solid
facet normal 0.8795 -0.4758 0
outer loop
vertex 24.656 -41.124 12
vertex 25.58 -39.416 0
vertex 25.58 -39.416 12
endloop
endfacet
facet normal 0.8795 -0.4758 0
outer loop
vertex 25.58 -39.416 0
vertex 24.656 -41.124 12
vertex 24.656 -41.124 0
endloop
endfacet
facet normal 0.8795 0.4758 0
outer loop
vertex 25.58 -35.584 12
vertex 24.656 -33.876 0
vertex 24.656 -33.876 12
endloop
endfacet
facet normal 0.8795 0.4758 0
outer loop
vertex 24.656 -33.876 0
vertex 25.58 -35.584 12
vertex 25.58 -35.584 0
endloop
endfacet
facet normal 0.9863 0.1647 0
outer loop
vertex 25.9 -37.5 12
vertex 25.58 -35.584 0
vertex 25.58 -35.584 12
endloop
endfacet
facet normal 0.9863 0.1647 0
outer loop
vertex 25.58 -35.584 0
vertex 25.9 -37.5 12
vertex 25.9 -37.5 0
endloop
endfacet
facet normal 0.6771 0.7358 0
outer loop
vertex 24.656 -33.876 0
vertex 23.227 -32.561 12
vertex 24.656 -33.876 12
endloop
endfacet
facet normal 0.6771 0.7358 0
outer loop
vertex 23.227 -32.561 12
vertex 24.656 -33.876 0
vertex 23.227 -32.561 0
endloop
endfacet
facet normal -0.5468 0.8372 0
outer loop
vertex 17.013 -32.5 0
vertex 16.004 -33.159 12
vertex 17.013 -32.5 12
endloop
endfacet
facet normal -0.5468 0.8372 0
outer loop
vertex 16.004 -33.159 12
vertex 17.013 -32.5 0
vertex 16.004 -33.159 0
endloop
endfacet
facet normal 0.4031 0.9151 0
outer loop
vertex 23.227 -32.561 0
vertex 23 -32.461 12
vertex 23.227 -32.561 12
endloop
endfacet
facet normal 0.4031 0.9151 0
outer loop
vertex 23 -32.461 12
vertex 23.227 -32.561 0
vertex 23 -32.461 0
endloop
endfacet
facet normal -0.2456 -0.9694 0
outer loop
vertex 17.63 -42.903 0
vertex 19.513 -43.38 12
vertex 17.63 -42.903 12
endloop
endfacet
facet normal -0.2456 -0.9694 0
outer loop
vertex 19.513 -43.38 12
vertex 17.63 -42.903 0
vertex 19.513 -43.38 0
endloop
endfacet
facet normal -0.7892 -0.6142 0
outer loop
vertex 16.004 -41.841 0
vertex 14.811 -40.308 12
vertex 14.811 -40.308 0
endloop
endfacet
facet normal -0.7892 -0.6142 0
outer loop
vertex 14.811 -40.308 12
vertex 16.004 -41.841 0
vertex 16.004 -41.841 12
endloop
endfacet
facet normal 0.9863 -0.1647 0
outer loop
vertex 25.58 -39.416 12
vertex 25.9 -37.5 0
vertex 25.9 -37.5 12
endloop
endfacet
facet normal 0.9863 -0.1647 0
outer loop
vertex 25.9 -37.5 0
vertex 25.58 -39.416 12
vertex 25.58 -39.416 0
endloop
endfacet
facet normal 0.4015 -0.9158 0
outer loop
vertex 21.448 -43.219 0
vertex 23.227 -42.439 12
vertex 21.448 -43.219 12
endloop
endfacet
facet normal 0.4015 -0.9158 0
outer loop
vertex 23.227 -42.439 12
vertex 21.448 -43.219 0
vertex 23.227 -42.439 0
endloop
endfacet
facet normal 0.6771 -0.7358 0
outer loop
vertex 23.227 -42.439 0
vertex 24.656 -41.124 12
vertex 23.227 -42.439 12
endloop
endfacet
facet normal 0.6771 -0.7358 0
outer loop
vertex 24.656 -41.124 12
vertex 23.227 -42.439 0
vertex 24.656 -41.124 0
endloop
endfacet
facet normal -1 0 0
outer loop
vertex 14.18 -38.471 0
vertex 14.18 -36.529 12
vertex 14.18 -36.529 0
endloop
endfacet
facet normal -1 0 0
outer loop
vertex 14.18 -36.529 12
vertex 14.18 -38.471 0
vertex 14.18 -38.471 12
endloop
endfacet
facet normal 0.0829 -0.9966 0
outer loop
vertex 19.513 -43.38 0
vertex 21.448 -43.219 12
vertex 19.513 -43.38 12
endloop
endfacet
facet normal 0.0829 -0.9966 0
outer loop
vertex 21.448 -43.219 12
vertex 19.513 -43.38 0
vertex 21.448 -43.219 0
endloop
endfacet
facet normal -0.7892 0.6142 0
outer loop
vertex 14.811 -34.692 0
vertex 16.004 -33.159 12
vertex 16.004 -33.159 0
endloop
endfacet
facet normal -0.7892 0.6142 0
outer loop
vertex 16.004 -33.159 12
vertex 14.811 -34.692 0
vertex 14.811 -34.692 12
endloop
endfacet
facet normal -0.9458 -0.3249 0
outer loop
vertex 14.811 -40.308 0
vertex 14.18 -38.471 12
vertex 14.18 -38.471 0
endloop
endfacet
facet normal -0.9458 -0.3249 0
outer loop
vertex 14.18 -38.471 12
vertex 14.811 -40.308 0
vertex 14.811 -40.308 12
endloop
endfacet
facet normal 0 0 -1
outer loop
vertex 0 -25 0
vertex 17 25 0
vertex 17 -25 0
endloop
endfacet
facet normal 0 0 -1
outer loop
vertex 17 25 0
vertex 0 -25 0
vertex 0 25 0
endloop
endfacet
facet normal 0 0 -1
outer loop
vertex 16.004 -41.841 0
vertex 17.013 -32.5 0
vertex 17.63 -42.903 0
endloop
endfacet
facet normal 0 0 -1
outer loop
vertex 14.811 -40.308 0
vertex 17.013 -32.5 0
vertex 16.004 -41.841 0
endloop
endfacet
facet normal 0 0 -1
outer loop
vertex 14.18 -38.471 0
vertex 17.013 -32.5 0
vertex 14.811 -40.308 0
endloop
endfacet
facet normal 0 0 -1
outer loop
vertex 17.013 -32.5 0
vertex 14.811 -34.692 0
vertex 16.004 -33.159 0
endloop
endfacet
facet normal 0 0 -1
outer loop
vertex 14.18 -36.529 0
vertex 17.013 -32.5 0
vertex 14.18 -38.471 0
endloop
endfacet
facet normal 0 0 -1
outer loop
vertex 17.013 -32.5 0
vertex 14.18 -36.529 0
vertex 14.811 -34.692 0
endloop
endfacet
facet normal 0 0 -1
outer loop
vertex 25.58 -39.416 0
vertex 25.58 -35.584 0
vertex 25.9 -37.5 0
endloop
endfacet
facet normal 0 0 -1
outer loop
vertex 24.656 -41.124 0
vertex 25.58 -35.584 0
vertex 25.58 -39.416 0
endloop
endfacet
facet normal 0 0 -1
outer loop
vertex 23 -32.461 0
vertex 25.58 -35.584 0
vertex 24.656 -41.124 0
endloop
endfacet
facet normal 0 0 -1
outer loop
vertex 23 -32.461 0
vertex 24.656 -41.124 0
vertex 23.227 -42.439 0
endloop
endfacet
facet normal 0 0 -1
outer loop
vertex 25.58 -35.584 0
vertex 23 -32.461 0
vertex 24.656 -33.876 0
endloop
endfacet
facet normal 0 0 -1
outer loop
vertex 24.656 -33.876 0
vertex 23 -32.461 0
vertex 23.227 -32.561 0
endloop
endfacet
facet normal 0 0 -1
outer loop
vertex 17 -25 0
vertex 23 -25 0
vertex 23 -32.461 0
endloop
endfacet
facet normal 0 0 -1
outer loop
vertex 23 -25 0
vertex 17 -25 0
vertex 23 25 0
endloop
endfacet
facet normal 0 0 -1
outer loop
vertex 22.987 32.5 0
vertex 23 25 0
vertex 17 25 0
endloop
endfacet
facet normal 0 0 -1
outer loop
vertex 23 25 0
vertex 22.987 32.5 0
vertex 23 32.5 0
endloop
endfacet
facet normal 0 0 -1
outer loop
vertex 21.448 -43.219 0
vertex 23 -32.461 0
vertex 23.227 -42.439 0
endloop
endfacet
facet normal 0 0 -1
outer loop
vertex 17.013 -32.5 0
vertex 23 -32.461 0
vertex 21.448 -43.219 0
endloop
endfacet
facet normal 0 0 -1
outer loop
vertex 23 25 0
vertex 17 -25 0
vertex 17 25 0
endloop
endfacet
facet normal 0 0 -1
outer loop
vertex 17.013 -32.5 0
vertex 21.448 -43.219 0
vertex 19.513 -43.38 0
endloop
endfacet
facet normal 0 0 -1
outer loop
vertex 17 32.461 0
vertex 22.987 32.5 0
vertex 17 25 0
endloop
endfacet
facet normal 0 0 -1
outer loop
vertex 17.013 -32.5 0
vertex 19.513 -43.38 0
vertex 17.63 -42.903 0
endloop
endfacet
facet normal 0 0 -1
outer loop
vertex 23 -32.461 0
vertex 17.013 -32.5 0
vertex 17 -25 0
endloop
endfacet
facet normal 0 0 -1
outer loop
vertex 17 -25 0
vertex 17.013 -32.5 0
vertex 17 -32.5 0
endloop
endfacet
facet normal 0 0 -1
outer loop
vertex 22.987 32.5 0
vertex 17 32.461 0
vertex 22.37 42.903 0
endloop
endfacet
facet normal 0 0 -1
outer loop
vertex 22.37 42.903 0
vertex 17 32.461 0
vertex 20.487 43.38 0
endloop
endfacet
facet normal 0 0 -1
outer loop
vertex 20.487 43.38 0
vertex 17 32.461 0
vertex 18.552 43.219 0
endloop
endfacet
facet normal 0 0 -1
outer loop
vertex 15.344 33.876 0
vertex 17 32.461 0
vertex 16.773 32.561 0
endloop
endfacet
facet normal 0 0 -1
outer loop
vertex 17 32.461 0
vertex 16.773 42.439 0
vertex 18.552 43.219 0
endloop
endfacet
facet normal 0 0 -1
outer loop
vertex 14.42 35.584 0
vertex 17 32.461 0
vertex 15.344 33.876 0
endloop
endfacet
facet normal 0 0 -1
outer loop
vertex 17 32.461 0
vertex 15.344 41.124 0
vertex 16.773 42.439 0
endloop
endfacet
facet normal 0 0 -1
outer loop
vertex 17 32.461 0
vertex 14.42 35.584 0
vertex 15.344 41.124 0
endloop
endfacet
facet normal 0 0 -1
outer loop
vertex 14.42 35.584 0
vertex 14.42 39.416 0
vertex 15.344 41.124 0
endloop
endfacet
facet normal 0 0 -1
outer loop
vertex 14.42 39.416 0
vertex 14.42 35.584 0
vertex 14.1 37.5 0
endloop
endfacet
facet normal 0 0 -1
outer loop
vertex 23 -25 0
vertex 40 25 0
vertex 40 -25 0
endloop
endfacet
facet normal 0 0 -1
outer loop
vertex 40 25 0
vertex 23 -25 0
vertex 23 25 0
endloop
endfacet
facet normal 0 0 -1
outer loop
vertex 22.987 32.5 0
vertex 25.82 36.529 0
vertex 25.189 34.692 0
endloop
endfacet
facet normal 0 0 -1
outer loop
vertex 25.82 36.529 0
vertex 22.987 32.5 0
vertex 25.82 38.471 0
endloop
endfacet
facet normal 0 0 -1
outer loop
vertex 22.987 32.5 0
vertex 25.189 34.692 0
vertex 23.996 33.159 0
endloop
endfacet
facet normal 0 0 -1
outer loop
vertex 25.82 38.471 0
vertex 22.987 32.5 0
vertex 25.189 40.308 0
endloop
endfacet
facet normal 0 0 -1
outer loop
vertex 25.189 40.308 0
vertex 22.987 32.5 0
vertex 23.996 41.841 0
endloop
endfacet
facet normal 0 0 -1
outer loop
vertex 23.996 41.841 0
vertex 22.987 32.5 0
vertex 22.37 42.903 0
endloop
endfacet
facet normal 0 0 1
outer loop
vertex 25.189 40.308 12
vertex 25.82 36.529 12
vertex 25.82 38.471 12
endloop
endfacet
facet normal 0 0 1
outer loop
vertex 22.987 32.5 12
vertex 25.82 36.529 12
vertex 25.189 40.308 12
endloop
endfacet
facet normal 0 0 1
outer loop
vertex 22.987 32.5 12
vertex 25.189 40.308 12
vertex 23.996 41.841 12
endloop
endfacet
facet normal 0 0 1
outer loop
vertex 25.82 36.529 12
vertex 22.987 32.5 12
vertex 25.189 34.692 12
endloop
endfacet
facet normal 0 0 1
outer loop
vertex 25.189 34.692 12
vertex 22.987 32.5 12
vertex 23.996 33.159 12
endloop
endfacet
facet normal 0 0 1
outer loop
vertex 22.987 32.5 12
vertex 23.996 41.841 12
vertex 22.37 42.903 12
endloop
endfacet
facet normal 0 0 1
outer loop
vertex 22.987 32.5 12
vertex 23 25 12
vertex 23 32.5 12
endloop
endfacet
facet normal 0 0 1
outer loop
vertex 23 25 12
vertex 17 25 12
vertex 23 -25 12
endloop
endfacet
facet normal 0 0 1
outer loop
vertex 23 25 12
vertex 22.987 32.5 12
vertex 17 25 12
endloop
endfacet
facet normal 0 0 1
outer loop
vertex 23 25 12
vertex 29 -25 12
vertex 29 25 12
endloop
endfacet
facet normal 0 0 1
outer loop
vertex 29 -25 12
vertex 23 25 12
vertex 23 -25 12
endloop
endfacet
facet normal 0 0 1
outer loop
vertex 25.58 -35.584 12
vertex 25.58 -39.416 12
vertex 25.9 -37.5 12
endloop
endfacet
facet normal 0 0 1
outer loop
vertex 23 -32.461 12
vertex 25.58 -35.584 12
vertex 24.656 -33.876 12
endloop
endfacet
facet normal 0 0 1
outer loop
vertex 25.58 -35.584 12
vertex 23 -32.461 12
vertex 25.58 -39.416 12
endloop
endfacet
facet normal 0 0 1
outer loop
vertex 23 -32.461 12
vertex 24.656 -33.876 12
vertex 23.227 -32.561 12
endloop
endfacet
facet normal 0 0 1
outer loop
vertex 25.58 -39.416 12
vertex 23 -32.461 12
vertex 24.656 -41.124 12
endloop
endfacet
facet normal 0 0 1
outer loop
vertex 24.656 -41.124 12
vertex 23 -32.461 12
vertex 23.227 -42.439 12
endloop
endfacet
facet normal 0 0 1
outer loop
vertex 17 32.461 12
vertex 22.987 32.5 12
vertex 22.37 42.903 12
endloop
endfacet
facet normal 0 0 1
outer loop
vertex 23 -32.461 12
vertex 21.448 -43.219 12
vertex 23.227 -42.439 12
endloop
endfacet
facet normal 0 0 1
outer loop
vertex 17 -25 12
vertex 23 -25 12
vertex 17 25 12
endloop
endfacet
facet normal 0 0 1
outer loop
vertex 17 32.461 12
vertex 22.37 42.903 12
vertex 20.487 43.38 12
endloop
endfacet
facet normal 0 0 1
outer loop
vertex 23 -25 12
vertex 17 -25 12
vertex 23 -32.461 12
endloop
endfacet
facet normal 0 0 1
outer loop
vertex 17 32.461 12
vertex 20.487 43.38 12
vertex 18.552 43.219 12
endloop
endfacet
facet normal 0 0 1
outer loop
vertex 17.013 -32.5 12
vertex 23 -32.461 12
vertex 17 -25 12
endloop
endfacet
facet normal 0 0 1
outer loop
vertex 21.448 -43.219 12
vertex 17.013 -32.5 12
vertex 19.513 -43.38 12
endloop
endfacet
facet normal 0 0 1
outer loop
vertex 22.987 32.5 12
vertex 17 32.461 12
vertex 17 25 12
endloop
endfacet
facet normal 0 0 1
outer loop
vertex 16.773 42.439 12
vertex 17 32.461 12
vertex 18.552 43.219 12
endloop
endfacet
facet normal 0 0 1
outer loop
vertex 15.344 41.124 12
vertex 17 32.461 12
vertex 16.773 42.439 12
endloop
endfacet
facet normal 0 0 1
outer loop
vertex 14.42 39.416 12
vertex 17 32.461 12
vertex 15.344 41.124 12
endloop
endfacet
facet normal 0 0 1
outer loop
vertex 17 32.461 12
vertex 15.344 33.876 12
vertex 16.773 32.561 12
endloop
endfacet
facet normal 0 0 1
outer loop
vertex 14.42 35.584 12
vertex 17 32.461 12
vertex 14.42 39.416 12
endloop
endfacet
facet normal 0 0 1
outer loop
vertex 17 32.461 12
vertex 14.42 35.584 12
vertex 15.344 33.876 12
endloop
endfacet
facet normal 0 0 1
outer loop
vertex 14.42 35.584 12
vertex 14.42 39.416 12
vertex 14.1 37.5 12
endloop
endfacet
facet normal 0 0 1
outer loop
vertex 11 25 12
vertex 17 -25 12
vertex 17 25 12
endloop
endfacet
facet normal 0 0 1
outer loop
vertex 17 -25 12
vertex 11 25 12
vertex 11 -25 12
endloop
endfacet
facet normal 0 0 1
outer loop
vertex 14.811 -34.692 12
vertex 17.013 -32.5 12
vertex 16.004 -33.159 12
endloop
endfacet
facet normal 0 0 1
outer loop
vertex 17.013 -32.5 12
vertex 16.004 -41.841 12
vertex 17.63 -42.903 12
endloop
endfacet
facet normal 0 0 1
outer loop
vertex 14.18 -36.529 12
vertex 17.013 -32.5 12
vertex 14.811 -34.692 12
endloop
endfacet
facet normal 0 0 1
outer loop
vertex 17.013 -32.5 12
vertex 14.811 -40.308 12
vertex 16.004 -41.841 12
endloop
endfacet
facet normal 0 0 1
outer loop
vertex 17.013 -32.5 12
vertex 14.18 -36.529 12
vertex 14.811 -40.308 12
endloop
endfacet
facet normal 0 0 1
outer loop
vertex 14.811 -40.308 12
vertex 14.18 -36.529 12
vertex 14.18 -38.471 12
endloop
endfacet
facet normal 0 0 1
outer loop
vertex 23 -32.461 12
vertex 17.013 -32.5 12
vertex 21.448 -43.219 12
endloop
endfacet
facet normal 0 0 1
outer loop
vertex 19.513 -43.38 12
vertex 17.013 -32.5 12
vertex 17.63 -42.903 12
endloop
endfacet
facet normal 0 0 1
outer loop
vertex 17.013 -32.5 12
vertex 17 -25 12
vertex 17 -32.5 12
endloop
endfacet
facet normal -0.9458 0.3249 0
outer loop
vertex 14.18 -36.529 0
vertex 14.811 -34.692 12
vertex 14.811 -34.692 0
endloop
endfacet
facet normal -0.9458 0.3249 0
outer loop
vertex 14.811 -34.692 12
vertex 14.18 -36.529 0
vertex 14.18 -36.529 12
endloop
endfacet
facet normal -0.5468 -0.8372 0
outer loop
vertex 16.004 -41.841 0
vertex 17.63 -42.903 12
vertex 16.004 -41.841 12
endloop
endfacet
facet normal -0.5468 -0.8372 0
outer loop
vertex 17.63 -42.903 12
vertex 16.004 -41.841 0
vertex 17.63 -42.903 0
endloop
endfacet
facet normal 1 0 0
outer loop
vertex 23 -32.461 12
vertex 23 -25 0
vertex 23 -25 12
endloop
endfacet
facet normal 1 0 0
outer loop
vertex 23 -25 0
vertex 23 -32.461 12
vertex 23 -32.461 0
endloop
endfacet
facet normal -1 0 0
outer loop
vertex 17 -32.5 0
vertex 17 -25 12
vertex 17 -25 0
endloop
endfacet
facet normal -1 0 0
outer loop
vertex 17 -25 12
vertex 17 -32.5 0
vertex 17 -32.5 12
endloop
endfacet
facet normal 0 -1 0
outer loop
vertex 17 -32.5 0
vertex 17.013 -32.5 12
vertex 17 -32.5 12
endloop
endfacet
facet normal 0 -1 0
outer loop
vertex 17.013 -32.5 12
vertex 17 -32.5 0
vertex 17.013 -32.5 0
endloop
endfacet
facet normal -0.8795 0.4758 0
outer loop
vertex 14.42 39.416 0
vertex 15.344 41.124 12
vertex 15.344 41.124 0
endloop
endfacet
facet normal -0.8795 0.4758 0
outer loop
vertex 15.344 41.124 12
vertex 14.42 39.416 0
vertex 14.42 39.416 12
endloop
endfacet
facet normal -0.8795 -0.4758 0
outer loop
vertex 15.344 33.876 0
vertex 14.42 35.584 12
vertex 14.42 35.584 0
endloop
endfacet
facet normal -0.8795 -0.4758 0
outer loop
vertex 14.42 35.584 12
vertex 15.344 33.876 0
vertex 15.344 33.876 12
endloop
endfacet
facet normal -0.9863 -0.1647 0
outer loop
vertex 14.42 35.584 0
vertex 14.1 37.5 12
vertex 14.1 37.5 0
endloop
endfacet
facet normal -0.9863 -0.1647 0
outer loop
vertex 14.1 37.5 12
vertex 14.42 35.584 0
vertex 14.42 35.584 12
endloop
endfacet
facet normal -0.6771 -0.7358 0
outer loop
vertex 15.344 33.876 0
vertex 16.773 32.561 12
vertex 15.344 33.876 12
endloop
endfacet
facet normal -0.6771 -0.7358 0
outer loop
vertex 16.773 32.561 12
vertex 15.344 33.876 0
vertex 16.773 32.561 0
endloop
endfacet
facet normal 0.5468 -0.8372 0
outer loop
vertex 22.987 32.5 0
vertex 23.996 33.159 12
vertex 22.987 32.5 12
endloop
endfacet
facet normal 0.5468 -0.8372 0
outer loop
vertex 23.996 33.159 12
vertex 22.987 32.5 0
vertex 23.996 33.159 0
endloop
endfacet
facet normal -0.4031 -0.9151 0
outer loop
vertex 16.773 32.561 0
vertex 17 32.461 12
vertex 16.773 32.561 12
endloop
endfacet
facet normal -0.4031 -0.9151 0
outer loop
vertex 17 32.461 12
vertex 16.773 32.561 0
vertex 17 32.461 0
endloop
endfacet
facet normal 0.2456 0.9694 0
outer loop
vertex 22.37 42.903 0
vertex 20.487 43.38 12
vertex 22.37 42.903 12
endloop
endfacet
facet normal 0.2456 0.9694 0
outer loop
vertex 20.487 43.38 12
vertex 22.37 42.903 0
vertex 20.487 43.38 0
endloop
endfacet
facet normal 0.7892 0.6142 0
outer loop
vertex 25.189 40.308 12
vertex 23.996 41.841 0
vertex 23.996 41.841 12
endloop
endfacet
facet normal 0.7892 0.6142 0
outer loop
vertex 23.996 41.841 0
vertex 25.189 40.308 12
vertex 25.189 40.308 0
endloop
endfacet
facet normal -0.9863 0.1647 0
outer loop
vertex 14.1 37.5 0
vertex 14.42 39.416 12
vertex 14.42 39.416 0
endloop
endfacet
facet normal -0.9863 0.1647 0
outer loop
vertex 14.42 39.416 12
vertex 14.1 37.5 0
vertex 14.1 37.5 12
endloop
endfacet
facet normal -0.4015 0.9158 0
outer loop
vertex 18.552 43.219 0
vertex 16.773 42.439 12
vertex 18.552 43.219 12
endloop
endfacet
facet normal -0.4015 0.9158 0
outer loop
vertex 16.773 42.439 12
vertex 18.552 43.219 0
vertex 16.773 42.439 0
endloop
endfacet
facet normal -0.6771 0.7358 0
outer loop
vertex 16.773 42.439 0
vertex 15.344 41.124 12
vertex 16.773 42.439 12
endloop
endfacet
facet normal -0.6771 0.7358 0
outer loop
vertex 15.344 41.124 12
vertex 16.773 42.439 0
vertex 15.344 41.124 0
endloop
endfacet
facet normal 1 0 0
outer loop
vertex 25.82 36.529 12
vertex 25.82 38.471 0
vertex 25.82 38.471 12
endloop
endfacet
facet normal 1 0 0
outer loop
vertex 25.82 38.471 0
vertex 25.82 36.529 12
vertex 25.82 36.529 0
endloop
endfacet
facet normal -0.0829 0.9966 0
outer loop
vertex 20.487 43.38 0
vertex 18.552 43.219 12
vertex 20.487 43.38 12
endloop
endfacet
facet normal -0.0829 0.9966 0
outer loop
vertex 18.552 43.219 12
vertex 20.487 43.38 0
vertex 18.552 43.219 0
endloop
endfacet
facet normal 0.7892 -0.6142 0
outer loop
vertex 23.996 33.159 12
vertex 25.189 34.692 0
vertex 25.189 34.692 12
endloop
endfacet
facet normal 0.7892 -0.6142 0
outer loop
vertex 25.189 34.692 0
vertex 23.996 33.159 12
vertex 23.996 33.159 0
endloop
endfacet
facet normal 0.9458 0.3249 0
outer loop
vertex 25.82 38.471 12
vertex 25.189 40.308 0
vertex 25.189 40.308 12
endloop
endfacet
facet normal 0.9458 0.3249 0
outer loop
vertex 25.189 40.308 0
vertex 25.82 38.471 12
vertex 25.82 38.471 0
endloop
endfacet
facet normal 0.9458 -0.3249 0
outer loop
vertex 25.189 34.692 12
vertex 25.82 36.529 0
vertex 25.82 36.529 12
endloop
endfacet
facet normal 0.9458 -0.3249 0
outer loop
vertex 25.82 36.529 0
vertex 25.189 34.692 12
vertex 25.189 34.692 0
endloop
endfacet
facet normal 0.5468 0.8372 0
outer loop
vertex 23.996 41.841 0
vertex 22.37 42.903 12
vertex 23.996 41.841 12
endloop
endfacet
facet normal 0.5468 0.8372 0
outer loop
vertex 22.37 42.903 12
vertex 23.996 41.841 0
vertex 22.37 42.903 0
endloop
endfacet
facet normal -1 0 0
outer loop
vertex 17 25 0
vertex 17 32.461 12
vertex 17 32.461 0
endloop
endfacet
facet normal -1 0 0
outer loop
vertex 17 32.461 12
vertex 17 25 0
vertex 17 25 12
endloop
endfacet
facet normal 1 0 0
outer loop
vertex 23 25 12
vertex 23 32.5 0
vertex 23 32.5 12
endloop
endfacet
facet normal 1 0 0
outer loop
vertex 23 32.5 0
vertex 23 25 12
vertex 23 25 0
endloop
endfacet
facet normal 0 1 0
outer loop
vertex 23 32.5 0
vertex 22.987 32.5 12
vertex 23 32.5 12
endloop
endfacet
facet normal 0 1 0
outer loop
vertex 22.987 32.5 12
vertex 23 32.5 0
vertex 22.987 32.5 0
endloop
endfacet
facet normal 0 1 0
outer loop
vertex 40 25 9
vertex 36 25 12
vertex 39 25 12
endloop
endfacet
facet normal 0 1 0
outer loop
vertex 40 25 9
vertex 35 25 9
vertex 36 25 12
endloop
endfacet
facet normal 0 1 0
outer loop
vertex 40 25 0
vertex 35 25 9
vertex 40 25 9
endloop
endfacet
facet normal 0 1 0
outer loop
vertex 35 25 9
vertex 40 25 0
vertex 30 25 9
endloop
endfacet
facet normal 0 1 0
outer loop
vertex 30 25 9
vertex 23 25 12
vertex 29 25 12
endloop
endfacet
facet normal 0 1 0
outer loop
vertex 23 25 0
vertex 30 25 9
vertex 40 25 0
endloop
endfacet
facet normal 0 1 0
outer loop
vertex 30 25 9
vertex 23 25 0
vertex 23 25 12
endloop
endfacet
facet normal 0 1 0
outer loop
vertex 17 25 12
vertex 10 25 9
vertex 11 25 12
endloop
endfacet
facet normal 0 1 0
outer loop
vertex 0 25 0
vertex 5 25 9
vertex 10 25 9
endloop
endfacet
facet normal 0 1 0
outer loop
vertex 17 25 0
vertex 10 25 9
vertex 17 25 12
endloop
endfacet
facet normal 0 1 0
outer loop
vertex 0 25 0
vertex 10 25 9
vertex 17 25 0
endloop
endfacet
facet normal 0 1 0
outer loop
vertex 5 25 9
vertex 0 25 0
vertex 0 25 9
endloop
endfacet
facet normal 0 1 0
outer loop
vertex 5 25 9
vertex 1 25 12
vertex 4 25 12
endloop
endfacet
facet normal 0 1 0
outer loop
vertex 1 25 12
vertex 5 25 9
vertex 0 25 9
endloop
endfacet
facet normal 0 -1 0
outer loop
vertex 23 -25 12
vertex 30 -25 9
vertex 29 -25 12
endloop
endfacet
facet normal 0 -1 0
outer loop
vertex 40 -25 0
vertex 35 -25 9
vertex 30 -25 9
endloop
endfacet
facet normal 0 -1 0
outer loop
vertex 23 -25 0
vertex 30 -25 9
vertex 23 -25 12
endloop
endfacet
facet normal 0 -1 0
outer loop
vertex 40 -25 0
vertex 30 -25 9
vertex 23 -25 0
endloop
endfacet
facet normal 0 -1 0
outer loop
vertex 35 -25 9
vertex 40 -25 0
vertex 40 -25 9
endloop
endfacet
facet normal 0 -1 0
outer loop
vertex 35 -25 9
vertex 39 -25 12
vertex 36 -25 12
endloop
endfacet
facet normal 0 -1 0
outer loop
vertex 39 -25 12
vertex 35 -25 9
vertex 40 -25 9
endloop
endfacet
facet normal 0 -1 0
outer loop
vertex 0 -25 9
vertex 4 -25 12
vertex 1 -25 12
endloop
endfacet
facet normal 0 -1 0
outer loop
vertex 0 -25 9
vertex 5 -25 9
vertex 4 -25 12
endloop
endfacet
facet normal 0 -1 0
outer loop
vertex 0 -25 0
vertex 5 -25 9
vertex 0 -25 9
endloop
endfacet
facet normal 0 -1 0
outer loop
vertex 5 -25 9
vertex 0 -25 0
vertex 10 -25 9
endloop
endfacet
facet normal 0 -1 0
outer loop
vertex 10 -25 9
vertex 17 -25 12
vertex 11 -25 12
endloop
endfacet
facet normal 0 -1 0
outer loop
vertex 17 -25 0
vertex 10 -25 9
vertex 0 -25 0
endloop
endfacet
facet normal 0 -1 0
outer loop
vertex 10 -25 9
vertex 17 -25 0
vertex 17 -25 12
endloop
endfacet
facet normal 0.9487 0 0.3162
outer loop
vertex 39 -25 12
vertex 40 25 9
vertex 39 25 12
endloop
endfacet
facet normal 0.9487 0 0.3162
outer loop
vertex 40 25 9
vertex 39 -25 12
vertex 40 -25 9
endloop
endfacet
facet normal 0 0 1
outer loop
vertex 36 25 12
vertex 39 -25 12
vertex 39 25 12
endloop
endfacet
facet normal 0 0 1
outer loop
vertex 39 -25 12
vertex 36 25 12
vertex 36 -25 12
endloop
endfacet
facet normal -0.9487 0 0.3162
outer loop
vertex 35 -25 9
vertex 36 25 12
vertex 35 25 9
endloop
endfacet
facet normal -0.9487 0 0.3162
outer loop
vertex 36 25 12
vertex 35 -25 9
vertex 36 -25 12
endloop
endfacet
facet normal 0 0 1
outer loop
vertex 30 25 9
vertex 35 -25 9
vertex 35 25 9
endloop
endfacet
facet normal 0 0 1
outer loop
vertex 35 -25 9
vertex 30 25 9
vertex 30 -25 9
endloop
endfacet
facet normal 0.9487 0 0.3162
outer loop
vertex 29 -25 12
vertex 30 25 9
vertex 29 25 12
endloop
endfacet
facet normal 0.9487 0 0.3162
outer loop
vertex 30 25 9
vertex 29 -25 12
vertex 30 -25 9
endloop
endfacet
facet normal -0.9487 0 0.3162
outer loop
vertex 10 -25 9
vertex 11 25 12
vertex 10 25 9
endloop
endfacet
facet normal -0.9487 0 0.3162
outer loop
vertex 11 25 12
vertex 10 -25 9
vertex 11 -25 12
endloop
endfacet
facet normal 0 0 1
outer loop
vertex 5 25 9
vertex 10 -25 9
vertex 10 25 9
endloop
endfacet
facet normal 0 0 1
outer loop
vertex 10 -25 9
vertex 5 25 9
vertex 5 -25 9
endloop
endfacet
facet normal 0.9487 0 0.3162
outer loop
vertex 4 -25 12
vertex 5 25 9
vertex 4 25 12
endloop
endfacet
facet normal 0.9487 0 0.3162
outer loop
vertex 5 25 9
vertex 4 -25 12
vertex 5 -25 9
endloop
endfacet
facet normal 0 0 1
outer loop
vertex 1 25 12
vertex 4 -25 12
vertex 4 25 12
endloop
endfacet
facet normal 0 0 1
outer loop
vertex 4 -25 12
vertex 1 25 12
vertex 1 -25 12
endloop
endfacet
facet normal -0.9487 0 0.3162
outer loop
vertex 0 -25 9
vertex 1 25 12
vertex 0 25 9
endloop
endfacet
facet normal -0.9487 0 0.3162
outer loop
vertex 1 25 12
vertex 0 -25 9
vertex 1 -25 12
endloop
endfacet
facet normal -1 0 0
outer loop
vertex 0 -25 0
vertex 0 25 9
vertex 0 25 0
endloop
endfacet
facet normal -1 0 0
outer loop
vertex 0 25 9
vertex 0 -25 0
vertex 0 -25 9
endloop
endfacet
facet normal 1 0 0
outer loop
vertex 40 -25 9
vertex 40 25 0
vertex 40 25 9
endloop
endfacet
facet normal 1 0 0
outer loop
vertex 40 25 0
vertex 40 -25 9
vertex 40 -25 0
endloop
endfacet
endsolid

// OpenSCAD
// [FL_INDEX: keywords="openscad, 3d_parametric, Toy_train_track, csg_solid" | COT="Parametric OpenSCAD design from 3DCodeverse"]
// Title: Toy train track

track_length=50;

rotate (a=[90,0,0]) linear_extrude(height =track_length, center = true) polygon(points = [ [0,0], [0,9], [1,12],[4,12],[5,9],[10,9],[11,12],[29,12],[30,9],[35,9],[36,12], [39,12],[40,9], [40,0]], path = [[0,1,2,3,4,5,6,7,8,9,10,11,12,13,14]]);

//peg
module peg(){
	translate ([0,-12.5,0])
	union(){
		cylinder(12,5.9,5.9);
		translate ([-3,5,0]) cube(size=[6,8,12]);
	}
}

translate ([20,-track_length/2,0]) peg();

translate ([20,track_length/2,0]) rotate(a=[0,0,180]) peg();
